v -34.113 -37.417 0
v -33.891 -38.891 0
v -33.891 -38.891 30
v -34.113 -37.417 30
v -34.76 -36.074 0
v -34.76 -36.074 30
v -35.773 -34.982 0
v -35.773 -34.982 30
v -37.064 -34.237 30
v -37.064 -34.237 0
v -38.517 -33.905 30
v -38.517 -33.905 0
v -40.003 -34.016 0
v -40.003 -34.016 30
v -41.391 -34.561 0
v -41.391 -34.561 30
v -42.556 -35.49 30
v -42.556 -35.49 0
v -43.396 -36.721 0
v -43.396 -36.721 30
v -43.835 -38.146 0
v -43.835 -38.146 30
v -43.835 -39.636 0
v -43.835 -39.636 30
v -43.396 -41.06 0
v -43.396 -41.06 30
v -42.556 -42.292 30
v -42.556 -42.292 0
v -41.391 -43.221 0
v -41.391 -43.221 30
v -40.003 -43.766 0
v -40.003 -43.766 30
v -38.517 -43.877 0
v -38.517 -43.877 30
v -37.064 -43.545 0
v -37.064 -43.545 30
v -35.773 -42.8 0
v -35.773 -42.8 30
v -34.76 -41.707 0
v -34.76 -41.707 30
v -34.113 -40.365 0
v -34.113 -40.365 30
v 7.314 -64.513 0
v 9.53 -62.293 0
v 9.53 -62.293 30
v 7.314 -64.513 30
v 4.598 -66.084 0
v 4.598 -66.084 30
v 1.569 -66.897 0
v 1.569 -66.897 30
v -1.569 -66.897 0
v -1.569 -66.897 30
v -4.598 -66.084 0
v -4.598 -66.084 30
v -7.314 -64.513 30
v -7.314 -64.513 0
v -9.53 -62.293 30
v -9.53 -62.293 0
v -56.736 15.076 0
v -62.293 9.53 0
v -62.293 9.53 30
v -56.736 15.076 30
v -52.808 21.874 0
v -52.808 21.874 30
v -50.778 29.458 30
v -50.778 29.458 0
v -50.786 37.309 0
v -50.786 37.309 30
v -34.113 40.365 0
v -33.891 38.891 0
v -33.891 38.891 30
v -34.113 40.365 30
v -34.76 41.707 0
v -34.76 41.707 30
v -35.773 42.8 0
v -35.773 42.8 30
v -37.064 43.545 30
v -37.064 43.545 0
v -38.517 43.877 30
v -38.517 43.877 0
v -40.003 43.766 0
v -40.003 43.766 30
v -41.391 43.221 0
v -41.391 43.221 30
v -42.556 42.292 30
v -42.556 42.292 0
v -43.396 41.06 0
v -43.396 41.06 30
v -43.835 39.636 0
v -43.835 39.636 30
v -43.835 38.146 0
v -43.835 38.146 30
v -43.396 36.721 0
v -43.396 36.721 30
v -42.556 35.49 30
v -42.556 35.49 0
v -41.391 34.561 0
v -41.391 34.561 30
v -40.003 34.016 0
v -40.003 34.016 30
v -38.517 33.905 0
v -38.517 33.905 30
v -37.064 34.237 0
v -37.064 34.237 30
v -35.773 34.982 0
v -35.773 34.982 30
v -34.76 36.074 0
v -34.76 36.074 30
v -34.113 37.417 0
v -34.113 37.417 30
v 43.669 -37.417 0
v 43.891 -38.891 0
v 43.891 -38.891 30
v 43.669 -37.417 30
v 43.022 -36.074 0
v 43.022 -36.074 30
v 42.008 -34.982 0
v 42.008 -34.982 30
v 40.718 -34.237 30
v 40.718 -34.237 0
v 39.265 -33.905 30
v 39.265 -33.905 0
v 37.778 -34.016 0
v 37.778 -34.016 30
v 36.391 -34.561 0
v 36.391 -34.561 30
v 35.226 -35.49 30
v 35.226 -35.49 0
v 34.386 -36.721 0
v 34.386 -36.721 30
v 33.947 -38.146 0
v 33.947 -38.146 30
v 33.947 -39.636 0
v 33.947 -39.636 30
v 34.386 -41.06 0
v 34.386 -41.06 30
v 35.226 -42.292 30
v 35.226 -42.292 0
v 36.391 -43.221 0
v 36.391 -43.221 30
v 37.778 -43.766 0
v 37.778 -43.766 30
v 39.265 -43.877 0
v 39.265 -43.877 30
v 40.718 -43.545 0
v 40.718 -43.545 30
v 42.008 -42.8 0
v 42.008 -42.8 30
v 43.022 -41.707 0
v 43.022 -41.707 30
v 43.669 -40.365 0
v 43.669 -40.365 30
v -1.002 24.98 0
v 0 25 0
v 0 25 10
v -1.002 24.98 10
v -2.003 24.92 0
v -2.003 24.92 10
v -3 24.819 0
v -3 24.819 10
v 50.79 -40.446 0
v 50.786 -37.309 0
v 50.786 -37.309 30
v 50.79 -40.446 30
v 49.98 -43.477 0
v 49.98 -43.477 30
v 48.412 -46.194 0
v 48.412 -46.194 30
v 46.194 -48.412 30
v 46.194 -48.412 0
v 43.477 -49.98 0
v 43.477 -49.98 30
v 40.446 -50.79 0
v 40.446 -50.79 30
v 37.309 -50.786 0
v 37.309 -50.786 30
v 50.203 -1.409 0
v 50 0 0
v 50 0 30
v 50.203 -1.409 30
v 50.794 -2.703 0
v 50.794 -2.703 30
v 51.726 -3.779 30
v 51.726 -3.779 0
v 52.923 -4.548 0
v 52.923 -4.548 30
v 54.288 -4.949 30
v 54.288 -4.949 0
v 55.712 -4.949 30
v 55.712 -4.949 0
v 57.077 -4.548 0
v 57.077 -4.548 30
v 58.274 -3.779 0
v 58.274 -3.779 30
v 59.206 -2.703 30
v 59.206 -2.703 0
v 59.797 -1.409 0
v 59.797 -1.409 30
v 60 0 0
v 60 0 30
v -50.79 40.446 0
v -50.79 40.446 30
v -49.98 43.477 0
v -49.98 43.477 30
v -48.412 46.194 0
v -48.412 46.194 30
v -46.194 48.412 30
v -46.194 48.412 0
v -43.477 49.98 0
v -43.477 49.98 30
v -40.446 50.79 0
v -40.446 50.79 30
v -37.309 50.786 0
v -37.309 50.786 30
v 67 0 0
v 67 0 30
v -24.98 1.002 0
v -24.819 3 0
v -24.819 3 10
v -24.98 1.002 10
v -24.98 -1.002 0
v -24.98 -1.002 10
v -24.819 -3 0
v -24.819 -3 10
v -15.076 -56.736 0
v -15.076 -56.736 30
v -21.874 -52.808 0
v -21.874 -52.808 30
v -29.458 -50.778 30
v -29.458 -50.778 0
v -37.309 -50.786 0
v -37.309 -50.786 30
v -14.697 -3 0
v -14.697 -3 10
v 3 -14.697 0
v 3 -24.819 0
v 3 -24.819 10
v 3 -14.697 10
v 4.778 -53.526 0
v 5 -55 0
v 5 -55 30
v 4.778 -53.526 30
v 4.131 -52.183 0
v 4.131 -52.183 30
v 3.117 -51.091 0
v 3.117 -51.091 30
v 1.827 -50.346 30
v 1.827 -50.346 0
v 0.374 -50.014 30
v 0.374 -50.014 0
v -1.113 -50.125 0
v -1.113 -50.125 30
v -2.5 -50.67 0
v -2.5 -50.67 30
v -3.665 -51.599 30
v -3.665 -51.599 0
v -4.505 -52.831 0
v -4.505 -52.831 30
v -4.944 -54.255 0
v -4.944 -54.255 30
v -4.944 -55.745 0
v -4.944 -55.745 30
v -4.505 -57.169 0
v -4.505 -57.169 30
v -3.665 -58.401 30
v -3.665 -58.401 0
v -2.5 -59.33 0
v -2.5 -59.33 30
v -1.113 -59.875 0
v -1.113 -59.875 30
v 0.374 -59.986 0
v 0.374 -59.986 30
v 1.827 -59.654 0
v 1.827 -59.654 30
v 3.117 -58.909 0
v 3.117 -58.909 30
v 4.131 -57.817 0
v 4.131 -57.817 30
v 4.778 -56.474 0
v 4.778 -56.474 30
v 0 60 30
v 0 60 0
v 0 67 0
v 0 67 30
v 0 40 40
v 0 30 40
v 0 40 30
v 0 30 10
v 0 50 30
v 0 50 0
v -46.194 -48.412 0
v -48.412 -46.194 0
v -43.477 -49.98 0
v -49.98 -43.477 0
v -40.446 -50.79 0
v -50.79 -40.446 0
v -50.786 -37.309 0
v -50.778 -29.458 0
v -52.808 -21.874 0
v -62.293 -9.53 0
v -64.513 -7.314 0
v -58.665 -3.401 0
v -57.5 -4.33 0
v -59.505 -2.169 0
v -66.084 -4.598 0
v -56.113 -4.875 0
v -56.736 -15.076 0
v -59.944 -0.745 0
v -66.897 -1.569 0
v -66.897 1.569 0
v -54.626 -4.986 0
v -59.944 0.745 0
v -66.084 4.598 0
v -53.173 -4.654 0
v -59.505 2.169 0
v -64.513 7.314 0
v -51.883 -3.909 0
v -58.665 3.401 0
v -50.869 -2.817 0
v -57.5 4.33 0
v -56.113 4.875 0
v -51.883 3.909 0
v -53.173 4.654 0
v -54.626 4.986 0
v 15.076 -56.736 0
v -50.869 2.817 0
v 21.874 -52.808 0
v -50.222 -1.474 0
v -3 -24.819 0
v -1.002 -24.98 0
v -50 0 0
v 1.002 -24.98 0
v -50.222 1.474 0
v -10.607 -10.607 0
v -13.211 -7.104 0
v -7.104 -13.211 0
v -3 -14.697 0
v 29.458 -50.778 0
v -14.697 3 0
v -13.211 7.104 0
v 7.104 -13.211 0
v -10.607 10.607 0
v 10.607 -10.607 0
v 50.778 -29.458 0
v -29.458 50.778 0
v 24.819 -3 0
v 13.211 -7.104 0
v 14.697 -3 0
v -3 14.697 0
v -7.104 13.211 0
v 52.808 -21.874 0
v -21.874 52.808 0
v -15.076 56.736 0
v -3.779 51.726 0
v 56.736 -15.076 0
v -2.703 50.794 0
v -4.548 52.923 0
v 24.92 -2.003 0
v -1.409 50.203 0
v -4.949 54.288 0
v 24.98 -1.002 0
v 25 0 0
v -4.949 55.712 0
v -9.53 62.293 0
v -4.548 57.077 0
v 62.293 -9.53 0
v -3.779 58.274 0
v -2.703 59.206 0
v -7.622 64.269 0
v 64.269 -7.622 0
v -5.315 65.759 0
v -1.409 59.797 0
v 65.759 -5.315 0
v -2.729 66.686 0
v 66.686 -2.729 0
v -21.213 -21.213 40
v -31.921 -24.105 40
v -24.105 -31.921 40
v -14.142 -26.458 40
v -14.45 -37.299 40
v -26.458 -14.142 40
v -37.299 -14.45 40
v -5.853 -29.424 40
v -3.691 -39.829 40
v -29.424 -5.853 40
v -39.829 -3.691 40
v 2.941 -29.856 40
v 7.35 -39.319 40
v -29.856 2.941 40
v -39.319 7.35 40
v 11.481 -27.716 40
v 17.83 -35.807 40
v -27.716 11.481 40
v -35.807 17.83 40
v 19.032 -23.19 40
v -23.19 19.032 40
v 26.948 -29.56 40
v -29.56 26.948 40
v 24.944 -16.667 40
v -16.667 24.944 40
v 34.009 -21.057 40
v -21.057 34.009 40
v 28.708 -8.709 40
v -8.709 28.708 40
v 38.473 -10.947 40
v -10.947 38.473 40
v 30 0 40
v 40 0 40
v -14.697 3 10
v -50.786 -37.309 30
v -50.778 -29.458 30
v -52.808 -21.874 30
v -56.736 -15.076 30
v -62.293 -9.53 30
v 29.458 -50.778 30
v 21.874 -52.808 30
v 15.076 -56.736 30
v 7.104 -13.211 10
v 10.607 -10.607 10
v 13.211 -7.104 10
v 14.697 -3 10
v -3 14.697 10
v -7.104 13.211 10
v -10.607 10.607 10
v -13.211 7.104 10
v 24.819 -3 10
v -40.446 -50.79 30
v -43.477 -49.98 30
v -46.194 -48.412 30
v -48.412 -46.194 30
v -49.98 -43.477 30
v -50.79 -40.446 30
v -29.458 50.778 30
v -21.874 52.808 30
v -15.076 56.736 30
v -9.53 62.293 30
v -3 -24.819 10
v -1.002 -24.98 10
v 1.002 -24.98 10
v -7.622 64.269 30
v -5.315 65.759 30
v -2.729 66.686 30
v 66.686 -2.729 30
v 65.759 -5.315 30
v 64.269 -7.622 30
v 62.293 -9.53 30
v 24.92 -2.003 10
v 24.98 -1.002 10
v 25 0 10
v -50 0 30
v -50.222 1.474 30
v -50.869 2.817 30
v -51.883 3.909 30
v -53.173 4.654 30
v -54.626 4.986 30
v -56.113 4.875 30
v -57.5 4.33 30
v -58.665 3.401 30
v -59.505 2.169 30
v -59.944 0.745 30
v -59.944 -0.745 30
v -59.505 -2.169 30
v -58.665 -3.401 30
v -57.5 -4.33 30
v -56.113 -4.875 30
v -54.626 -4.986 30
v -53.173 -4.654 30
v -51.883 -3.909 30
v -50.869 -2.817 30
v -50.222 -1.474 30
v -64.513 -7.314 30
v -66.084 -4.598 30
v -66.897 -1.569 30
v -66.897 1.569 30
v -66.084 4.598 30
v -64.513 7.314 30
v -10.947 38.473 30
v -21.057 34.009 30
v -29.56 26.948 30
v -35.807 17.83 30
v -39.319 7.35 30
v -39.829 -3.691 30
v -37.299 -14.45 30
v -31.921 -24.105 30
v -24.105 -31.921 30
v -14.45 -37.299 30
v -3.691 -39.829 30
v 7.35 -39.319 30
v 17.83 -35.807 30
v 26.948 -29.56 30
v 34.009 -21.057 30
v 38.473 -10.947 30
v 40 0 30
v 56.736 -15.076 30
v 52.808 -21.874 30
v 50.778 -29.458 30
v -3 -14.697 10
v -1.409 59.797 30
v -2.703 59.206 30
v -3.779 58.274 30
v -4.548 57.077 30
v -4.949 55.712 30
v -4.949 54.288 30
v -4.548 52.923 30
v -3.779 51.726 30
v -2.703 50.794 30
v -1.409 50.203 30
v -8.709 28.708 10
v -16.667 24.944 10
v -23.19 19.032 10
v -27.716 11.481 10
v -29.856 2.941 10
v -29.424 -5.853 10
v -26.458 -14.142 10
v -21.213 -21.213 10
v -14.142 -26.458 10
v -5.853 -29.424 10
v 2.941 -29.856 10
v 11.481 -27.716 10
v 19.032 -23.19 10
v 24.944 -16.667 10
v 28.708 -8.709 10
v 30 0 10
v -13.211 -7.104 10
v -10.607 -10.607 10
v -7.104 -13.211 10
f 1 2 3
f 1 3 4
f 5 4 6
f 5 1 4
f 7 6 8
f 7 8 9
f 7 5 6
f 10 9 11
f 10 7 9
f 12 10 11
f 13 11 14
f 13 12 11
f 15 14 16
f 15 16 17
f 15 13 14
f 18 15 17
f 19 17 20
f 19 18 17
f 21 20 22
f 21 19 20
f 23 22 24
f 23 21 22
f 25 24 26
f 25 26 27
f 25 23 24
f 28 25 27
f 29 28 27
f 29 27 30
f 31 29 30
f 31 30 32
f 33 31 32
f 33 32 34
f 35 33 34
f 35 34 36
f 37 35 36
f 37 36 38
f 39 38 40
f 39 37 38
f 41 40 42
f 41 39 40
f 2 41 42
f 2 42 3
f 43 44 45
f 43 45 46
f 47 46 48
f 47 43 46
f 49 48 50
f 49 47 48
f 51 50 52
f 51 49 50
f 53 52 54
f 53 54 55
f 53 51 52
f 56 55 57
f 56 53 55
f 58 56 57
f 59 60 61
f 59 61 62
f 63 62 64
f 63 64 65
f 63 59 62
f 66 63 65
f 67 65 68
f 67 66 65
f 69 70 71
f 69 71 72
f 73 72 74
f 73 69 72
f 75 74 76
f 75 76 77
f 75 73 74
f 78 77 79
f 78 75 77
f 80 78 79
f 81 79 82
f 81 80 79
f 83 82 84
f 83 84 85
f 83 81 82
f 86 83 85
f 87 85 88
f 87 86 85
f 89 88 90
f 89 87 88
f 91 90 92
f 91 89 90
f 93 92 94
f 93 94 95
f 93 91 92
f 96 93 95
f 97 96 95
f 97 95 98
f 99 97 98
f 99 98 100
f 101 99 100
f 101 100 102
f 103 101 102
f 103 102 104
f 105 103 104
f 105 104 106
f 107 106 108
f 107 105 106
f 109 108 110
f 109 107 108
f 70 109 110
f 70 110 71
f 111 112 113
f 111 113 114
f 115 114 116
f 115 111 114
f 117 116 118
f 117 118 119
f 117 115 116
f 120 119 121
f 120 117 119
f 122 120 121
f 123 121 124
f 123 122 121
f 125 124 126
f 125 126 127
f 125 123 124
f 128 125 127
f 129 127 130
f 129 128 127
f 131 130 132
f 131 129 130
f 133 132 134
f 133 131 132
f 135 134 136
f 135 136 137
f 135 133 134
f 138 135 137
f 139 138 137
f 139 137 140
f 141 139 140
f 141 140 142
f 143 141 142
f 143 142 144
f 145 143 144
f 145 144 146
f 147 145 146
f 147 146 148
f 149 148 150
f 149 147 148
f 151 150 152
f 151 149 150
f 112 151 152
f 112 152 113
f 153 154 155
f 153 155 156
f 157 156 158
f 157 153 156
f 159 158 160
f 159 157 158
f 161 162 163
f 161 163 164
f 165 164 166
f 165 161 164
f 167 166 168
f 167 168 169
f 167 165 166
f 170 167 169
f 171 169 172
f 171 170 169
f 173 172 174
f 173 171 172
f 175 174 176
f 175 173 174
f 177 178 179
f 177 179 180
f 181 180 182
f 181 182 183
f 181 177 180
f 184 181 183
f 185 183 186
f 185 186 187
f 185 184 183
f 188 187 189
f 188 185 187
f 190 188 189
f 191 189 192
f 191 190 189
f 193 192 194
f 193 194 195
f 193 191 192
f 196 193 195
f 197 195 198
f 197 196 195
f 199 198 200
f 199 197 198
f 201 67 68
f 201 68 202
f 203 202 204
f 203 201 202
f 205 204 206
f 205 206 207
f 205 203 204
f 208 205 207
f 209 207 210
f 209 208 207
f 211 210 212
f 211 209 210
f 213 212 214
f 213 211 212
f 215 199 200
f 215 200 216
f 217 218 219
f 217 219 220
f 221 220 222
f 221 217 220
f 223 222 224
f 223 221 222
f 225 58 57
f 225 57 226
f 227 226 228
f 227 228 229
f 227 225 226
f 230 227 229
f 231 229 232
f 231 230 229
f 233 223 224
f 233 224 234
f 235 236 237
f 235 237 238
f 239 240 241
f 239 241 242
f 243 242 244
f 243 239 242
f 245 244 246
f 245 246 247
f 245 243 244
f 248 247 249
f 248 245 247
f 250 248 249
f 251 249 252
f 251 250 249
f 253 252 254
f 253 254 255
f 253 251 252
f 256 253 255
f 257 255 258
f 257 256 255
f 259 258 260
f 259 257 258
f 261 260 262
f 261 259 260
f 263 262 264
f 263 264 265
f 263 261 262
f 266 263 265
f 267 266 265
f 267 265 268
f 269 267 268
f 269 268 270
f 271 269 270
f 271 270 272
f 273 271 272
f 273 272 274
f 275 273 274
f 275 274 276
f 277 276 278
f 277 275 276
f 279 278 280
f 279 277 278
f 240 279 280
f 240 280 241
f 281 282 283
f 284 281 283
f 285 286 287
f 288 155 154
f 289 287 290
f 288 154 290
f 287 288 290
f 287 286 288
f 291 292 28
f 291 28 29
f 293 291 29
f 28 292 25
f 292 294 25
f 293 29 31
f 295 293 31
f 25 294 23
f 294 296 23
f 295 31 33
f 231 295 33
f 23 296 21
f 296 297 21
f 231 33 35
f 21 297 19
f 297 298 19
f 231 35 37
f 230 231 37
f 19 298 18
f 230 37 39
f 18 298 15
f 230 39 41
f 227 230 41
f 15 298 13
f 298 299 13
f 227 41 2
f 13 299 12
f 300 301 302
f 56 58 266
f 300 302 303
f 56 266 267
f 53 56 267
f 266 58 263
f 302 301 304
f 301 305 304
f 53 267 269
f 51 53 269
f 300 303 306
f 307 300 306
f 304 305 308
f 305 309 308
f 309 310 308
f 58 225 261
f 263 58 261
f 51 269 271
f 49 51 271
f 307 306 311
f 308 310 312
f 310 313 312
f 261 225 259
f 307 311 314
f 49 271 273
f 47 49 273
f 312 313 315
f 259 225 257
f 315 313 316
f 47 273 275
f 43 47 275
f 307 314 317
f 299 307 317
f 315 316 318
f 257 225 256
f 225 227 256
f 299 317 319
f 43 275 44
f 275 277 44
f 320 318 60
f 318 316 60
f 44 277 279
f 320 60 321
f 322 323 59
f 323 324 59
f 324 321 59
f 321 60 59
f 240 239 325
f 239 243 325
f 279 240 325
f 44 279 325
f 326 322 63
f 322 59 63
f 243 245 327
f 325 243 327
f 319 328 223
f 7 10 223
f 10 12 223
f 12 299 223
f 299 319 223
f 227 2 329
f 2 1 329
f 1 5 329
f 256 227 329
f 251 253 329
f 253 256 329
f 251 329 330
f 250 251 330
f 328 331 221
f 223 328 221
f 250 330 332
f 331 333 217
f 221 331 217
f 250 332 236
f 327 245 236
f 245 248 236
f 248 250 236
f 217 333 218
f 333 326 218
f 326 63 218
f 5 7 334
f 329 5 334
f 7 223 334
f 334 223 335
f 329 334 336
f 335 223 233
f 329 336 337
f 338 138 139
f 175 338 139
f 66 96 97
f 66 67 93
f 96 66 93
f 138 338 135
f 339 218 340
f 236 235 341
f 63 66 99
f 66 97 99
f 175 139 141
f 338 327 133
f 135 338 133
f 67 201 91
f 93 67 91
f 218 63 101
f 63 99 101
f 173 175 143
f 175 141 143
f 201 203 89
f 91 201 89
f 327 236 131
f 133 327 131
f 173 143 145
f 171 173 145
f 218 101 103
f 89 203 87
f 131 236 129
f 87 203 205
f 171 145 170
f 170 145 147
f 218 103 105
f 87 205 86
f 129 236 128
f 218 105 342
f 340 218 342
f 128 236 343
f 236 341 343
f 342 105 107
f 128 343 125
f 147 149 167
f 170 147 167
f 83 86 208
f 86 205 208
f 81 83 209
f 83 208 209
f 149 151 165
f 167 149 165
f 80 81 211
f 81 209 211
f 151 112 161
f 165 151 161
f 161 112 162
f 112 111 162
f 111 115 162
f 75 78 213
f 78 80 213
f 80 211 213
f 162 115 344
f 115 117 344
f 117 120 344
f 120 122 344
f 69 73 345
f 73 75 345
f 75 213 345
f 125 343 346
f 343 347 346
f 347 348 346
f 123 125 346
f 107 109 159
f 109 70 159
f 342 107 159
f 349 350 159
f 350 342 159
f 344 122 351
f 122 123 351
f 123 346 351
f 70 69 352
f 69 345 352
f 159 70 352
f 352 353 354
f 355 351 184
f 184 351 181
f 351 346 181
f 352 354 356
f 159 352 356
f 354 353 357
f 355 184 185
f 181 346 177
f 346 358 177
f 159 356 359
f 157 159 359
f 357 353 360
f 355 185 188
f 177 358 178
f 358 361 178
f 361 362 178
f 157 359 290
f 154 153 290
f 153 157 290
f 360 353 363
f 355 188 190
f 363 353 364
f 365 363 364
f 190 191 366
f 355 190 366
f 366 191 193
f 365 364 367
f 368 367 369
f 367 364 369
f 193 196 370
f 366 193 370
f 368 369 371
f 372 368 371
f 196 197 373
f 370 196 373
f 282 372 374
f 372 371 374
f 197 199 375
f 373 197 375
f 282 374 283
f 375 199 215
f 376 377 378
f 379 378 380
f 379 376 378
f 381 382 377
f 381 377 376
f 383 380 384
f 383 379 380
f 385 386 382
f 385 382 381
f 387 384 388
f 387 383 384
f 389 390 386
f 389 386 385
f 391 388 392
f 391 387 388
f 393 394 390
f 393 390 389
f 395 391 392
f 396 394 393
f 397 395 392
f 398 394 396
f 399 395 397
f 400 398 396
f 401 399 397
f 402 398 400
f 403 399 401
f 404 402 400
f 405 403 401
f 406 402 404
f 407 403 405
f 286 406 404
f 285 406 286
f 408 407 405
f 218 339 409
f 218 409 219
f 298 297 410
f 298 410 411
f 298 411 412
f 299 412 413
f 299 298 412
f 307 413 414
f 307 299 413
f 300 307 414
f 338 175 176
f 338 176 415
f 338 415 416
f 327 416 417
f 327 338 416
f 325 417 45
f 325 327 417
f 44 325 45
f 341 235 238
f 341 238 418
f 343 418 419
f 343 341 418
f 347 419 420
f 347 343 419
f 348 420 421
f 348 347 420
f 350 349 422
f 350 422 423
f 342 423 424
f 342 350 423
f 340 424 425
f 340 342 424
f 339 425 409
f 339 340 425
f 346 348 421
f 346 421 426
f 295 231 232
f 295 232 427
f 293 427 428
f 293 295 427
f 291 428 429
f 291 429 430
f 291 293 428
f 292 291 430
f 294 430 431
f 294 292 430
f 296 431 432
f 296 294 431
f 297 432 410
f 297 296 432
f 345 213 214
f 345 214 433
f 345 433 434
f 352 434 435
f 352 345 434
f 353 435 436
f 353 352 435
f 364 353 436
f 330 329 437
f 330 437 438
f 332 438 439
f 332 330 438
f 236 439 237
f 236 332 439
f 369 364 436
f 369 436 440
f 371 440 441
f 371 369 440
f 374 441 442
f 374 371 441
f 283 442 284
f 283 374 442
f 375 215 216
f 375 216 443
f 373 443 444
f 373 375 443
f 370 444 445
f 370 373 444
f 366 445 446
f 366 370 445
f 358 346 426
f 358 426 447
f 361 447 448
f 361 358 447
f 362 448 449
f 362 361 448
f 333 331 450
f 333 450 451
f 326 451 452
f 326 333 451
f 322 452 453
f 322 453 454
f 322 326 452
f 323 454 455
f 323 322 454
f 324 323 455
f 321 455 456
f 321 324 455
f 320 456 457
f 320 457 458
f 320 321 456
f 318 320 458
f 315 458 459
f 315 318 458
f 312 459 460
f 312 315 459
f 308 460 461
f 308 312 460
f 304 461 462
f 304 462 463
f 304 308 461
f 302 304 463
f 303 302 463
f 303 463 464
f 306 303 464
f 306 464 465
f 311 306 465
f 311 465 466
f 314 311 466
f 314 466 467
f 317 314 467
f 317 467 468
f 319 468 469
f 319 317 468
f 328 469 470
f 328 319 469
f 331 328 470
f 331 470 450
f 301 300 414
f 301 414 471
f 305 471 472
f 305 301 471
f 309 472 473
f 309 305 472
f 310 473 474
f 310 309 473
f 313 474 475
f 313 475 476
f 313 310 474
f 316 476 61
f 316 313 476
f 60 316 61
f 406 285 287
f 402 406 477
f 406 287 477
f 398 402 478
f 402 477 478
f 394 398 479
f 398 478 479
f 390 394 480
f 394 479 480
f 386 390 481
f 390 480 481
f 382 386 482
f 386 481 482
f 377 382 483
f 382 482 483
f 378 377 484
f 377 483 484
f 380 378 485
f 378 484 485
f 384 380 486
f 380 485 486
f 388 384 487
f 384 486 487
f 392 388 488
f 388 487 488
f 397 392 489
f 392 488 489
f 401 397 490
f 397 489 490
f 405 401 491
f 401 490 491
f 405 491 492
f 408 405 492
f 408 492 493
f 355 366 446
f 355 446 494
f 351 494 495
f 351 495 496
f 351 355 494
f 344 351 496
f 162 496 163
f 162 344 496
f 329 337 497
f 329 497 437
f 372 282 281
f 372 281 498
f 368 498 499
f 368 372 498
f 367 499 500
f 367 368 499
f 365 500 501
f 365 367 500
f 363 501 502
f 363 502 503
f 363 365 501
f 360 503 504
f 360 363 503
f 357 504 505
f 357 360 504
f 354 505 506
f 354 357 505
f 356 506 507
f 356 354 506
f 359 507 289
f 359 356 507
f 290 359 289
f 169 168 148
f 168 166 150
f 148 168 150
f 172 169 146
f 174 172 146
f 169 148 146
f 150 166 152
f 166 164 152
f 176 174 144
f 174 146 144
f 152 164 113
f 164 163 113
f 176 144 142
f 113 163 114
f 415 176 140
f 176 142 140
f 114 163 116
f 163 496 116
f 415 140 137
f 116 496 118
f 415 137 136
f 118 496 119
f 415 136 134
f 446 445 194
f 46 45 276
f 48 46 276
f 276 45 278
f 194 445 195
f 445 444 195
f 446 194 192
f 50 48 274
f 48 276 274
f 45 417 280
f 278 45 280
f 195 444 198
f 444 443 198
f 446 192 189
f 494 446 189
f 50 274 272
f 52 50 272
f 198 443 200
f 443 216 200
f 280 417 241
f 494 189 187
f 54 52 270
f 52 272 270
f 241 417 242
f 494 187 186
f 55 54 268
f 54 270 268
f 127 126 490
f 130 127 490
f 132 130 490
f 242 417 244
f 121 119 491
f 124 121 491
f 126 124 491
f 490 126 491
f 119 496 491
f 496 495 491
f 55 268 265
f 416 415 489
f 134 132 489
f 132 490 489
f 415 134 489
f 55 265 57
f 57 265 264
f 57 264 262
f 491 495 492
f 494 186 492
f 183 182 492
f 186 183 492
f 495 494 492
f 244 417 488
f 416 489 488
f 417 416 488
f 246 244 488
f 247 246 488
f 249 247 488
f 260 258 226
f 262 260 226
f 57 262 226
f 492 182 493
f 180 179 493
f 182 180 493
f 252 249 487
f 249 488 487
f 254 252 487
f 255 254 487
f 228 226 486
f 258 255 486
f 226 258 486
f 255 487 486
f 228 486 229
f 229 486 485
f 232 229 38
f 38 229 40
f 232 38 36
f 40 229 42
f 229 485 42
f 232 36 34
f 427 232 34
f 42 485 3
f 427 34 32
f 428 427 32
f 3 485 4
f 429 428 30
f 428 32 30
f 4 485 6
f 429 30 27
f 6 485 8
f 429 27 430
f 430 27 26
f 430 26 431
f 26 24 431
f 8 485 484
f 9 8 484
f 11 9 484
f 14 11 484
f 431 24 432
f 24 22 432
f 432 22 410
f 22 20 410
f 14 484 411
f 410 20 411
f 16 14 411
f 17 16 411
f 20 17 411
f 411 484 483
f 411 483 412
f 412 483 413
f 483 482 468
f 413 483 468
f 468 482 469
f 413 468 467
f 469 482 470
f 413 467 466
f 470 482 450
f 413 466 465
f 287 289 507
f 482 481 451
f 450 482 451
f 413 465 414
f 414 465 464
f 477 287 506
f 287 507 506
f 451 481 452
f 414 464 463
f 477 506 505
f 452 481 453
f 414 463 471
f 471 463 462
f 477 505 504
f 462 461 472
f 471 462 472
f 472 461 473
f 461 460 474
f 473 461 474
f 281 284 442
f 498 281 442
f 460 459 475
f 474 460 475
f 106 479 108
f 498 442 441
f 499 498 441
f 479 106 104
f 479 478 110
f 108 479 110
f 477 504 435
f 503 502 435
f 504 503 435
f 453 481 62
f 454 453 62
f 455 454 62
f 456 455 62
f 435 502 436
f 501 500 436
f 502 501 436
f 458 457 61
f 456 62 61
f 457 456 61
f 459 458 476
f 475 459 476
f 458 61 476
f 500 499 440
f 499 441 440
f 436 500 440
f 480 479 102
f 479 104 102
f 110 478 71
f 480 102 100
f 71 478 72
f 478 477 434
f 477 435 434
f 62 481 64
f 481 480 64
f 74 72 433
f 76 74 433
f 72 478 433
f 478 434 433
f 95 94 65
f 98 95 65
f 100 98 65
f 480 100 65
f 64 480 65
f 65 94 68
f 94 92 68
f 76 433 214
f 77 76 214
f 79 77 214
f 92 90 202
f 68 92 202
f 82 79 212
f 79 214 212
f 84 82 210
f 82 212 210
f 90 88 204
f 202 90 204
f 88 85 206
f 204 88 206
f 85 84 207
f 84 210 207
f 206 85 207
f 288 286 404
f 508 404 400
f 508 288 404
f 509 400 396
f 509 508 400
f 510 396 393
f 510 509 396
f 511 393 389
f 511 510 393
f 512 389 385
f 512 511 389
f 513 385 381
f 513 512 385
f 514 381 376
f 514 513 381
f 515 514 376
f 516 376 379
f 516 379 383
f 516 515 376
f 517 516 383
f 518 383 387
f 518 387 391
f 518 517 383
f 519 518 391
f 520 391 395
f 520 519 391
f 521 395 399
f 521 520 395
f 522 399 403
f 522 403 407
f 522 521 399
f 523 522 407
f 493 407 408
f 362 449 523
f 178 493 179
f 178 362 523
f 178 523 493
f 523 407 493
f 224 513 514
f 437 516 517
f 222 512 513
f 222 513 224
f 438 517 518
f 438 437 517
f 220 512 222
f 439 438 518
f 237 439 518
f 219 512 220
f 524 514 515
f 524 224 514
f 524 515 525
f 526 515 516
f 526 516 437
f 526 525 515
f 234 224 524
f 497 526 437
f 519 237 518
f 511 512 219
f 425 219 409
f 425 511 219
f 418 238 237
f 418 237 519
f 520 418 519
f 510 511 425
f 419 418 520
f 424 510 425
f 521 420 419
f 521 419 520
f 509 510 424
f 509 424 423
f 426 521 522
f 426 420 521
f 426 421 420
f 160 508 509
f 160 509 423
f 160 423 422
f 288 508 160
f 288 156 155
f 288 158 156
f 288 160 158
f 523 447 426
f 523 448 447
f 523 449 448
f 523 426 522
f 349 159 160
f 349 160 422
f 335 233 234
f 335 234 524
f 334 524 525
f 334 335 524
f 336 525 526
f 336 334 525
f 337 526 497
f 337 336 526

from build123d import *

# Parameters (mm, degrees)
SKETCH2_R           = 5
SKETCH2_R_2         = 40
BOSS_EXTRUDE1_DEPTH = 30
SKETCH2_4_R         = 40
SKETCH2_4_R_2       = 30
BOSS_EXTRUDE2_DEPTH = 40
SKETCH2_5_R         = 30
BOSS_EXTRUDE3_DEPTH = 10
SKETCH3_W           = 75
SKETCH3_H           = 75
CUT_EXTRUDE1_DEPTH  = 40


with BuildPart() as part:
    # Sketch2 → Boss-Extrude1 (new body)
    with BuildSketch(Plane.XY):
        with BuildLine():
            ThreePointArc((-50.786151046, 37.308988209), (-52.807960272, 21.873773346), (-62.292670356, 9.529793233))
            ThreePointArc((-62.292670356, 9.529793233), (-67, 0), (-62.292670356, -9.529793233))
            ThreePointArc((-62.292670356, -9.529793233), (-52.807960272, -21.873773346), (-50.786151046, -37.308988209))
            ThreePointArc((-50.786151046, -37.308988209), (-47.376154339, -47.376154339), (-37.308988209, -50.786151046))
            ThreePointArc((-37.308988209, -50.786151046), (-21.873773346, -52.807960272), (-9.529793233, -62.292670356))
            ThreePointArc((-9.529793233, -62.292670356), (0, -67), (9.529793233, -62.292670356))
            ThreePointArc((9.529793233, -62.292670356), (21.873773346, -52.807960272), (37.308988209, -50.786151046))
            ThreePointArc((37.308988209, -50.786151046), (47.376154339, -47.376154339), (50.786151046, -37.308988209))
            ThreePointArc((50.786151046, -37.308988209), (52.807960272, -21.873773346), (62.292670356, -9.529793233))
            ThreePointArc((62.292670356, -9.529793233), (67, 0), (62.292670356, 9.529793233))
            ThreePointArc((62.292670356, 9.529793233), (52.807960272, 21.873773346), (50.786151046, 37.308988209))
            ThreePointArc((50.786151046, 37.308988209), (47.376154339, 47.376154339), (37.308988209, 50.786151046))
            ThreePointArc((37.308988209, 50.786151046), (21.873773346, 52.807960272), (9.529793233, 62.292670356))
            ThreePointArc((9.529793233, 62.292670356), (0, 67), (-9.529793233, 62.292670356))
            ThreePointArc((-9.529793233, 62.292670356), (-21.873773346, 52.807960272), (-37.308988209, 50.786151046))
            ThreePointArc((-37.308988209, 50.786151046), (-47.376154339, 47.376154339), (-50.786151046, 37.308988209))
        make_face()
        with Locations((-38.890872965, -38.890872965)):
            Circle(SKETCH2_R, mode=Mode.SUBTRACT)
        with Locations((0, -55)):
            Circle(SKETCH2_R, mode=Mode.SUBTRACT)
        with Locations((-55, 0)):
            Circle(SKETCH2_R, mode=Mode.SUBTRACT)
        with Locations((38.890872965, -38.890872965)):
            Circle(SKETCH2_R, mode=Mode.SUBTRACT)
        Circle(SKETCH2_R_2, mode=Mode.SUBTRACT)
        with Locations((55, 0)):
            Circle(SKETCH2_R, mode=Mode.SUBTRACT)
        with Locations((-38.890872965, 38.890872965)):
            Circle(SKETCH2_R, mode=Mode.SUBTRACT)
        with Locations((0, 55)):
            Circle(SKETCH2_R, mode=Mode.SUBTRACT)
        with Locations((38.890872965, 38.890872965)):
            Circle(SKETCH2_R, mode=Mode.SUBTRACT)
    extrude(amount=BOSS_EXTRUDE1_DEPTH)

    # Sketch2<4> → Boss-Extrude2 (add)
    with BuildSketch(Plane.XY):
        Circle(SKETCH2_4_R)
        Circle(SKETCH2_4_R_2, mode=Mode.SUBTRACT)
    extrude(amount=BOSS_EXTRUDE2_DEPTH)

    # Sketch2<5> → Boss-Extrude3 (add)
    with BuildSketch(Plane.XY):
        Circle(SKETCH2_5_R)
        with BuildLine():
            ThreePointArc((-24.819347292, -3), (-25, 0), (-24.819347292, 3))
            Line((-24.819347292, 3), (-14.696938457, 3))
            ThreePointArc((-14.696938457, 3), (-10.606601718, 10.606601718), (-3, 14.696938457))
            Line((-3, 14.696938457), (-3, 24.819347292))
            ThreePointArc((-3, 24.819347292), (0, 25), (3, 24.819347292))
            Line((3, 24.819347292), (3, 14.696938457))
            ThreePointArc((3, 14.696938457), (10.606601718, 10.606601718), (14.696938457, 3))
            Line((14.696938457, 3), (24.819347292, 3))
            ThreePointArc((24.819347292, 3), (25, 0), (24.819347292, -3))
            Line((24.819347292, -3), (14.696938457, -3))
            ThreePointArc((14.696938457, -3), (10.606601718, -10.606601718), (3, -14.696938457))
            Line((3, -14.696938457), (3, -24.819347292))
            ThreePointArc((3, -24.819347292), (0, -25), (-3, -24.819347292))
            Line((-3, -24.819347292), (-3, -14.696938457))
            ThreePointArc((-3, -14.696938457), (-10.606601718, -10.606601718), (-14.696938457, -3))
            Line((-14.696938457, -3), (-24.819347292, -3))
        make_face(mode=Mode.SUBTRACT)
    extrude(amount=BOSS_EXTRUDE3_DEPTH)

    # Sketch3 → Cut-Extrude1 (cut)
    with BuildSketch(Plane.XY):
        with Locations((37.5, 37.5)):
            Rectangle(SKETCH3_W, SKETCH3_H)
    extrude(amount=CUT_EXTRUDE1_DEPTH, mode=Mode.SUBTRACT)


solid = part.part
